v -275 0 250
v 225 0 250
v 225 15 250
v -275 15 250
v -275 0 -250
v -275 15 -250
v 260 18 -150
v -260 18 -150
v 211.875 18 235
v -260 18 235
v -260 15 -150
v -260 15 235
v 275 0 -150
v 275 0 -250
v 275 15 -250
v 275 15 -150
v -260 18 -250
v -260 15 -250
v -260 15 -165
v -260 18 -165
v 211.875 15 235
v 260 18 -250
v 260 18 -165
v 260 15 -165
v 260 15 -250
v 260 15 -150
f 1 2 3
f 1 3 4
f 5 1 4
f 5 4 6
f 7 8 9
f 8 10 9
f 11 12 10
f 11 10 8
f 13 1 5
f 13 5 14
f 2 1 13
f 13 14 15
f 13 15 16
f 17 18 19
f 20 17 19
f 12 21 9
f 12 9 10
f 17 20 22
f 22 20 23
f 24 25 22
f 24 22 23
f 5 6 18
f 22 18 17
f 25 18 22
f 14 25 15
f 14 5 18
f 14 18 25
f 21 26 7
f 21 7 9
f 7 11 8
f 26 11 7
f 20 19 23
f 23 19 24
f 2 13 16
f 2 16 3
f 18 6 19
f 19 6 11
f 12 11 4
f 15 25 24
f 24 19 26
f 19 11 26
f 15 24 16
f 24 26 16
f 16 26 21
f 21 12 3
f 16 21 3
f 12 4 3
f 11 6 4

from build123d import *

# Parameters (mm, degrees)
F1_DEPTH = 18
F0_W     = 520
F0_H     = 85
F2_DEPTH = 15


with BuildPart() as f1:
    # F0 (on Front) → F1 (new body)
    with BuildSketch(Plane.XZ):
        Polygon((-260, -150), (260, -150), (211.875, 235), (-260, 235), align=None)
    extrude(amount=-F1_DEPTH)



with BuildPart() as f1b:
    # F0 (on Front) → F1, piece 2 (new body)
    with BuildSketch(Plane.XZ):
        with Locations((0, -207.5)):
            Rectangle(F0_W, F0_H)
    extrude(amount=-F1_DEPTH)


with BuildPart() as f1_1:
    add(f1.part)

    add(f1b.part)  # F2 merges F1b
    # F0 (on Front) → F2 (join)
    with BuildSketch(Plane.XZ):
        Polygon((275, -150), (225, 250), (-275, 250), (-275, -250), (-260, -250), (-260, -165), (260, -165), (260, -250), (275, -250), align=None)
        Polygon((211.875, 235), (260, -150), (-260, -150), (-260, 235), align=None, mode=Mode.SUBTRACT)
    extrude(amount=-F2_DEPTH)


solid = f1_1.part
